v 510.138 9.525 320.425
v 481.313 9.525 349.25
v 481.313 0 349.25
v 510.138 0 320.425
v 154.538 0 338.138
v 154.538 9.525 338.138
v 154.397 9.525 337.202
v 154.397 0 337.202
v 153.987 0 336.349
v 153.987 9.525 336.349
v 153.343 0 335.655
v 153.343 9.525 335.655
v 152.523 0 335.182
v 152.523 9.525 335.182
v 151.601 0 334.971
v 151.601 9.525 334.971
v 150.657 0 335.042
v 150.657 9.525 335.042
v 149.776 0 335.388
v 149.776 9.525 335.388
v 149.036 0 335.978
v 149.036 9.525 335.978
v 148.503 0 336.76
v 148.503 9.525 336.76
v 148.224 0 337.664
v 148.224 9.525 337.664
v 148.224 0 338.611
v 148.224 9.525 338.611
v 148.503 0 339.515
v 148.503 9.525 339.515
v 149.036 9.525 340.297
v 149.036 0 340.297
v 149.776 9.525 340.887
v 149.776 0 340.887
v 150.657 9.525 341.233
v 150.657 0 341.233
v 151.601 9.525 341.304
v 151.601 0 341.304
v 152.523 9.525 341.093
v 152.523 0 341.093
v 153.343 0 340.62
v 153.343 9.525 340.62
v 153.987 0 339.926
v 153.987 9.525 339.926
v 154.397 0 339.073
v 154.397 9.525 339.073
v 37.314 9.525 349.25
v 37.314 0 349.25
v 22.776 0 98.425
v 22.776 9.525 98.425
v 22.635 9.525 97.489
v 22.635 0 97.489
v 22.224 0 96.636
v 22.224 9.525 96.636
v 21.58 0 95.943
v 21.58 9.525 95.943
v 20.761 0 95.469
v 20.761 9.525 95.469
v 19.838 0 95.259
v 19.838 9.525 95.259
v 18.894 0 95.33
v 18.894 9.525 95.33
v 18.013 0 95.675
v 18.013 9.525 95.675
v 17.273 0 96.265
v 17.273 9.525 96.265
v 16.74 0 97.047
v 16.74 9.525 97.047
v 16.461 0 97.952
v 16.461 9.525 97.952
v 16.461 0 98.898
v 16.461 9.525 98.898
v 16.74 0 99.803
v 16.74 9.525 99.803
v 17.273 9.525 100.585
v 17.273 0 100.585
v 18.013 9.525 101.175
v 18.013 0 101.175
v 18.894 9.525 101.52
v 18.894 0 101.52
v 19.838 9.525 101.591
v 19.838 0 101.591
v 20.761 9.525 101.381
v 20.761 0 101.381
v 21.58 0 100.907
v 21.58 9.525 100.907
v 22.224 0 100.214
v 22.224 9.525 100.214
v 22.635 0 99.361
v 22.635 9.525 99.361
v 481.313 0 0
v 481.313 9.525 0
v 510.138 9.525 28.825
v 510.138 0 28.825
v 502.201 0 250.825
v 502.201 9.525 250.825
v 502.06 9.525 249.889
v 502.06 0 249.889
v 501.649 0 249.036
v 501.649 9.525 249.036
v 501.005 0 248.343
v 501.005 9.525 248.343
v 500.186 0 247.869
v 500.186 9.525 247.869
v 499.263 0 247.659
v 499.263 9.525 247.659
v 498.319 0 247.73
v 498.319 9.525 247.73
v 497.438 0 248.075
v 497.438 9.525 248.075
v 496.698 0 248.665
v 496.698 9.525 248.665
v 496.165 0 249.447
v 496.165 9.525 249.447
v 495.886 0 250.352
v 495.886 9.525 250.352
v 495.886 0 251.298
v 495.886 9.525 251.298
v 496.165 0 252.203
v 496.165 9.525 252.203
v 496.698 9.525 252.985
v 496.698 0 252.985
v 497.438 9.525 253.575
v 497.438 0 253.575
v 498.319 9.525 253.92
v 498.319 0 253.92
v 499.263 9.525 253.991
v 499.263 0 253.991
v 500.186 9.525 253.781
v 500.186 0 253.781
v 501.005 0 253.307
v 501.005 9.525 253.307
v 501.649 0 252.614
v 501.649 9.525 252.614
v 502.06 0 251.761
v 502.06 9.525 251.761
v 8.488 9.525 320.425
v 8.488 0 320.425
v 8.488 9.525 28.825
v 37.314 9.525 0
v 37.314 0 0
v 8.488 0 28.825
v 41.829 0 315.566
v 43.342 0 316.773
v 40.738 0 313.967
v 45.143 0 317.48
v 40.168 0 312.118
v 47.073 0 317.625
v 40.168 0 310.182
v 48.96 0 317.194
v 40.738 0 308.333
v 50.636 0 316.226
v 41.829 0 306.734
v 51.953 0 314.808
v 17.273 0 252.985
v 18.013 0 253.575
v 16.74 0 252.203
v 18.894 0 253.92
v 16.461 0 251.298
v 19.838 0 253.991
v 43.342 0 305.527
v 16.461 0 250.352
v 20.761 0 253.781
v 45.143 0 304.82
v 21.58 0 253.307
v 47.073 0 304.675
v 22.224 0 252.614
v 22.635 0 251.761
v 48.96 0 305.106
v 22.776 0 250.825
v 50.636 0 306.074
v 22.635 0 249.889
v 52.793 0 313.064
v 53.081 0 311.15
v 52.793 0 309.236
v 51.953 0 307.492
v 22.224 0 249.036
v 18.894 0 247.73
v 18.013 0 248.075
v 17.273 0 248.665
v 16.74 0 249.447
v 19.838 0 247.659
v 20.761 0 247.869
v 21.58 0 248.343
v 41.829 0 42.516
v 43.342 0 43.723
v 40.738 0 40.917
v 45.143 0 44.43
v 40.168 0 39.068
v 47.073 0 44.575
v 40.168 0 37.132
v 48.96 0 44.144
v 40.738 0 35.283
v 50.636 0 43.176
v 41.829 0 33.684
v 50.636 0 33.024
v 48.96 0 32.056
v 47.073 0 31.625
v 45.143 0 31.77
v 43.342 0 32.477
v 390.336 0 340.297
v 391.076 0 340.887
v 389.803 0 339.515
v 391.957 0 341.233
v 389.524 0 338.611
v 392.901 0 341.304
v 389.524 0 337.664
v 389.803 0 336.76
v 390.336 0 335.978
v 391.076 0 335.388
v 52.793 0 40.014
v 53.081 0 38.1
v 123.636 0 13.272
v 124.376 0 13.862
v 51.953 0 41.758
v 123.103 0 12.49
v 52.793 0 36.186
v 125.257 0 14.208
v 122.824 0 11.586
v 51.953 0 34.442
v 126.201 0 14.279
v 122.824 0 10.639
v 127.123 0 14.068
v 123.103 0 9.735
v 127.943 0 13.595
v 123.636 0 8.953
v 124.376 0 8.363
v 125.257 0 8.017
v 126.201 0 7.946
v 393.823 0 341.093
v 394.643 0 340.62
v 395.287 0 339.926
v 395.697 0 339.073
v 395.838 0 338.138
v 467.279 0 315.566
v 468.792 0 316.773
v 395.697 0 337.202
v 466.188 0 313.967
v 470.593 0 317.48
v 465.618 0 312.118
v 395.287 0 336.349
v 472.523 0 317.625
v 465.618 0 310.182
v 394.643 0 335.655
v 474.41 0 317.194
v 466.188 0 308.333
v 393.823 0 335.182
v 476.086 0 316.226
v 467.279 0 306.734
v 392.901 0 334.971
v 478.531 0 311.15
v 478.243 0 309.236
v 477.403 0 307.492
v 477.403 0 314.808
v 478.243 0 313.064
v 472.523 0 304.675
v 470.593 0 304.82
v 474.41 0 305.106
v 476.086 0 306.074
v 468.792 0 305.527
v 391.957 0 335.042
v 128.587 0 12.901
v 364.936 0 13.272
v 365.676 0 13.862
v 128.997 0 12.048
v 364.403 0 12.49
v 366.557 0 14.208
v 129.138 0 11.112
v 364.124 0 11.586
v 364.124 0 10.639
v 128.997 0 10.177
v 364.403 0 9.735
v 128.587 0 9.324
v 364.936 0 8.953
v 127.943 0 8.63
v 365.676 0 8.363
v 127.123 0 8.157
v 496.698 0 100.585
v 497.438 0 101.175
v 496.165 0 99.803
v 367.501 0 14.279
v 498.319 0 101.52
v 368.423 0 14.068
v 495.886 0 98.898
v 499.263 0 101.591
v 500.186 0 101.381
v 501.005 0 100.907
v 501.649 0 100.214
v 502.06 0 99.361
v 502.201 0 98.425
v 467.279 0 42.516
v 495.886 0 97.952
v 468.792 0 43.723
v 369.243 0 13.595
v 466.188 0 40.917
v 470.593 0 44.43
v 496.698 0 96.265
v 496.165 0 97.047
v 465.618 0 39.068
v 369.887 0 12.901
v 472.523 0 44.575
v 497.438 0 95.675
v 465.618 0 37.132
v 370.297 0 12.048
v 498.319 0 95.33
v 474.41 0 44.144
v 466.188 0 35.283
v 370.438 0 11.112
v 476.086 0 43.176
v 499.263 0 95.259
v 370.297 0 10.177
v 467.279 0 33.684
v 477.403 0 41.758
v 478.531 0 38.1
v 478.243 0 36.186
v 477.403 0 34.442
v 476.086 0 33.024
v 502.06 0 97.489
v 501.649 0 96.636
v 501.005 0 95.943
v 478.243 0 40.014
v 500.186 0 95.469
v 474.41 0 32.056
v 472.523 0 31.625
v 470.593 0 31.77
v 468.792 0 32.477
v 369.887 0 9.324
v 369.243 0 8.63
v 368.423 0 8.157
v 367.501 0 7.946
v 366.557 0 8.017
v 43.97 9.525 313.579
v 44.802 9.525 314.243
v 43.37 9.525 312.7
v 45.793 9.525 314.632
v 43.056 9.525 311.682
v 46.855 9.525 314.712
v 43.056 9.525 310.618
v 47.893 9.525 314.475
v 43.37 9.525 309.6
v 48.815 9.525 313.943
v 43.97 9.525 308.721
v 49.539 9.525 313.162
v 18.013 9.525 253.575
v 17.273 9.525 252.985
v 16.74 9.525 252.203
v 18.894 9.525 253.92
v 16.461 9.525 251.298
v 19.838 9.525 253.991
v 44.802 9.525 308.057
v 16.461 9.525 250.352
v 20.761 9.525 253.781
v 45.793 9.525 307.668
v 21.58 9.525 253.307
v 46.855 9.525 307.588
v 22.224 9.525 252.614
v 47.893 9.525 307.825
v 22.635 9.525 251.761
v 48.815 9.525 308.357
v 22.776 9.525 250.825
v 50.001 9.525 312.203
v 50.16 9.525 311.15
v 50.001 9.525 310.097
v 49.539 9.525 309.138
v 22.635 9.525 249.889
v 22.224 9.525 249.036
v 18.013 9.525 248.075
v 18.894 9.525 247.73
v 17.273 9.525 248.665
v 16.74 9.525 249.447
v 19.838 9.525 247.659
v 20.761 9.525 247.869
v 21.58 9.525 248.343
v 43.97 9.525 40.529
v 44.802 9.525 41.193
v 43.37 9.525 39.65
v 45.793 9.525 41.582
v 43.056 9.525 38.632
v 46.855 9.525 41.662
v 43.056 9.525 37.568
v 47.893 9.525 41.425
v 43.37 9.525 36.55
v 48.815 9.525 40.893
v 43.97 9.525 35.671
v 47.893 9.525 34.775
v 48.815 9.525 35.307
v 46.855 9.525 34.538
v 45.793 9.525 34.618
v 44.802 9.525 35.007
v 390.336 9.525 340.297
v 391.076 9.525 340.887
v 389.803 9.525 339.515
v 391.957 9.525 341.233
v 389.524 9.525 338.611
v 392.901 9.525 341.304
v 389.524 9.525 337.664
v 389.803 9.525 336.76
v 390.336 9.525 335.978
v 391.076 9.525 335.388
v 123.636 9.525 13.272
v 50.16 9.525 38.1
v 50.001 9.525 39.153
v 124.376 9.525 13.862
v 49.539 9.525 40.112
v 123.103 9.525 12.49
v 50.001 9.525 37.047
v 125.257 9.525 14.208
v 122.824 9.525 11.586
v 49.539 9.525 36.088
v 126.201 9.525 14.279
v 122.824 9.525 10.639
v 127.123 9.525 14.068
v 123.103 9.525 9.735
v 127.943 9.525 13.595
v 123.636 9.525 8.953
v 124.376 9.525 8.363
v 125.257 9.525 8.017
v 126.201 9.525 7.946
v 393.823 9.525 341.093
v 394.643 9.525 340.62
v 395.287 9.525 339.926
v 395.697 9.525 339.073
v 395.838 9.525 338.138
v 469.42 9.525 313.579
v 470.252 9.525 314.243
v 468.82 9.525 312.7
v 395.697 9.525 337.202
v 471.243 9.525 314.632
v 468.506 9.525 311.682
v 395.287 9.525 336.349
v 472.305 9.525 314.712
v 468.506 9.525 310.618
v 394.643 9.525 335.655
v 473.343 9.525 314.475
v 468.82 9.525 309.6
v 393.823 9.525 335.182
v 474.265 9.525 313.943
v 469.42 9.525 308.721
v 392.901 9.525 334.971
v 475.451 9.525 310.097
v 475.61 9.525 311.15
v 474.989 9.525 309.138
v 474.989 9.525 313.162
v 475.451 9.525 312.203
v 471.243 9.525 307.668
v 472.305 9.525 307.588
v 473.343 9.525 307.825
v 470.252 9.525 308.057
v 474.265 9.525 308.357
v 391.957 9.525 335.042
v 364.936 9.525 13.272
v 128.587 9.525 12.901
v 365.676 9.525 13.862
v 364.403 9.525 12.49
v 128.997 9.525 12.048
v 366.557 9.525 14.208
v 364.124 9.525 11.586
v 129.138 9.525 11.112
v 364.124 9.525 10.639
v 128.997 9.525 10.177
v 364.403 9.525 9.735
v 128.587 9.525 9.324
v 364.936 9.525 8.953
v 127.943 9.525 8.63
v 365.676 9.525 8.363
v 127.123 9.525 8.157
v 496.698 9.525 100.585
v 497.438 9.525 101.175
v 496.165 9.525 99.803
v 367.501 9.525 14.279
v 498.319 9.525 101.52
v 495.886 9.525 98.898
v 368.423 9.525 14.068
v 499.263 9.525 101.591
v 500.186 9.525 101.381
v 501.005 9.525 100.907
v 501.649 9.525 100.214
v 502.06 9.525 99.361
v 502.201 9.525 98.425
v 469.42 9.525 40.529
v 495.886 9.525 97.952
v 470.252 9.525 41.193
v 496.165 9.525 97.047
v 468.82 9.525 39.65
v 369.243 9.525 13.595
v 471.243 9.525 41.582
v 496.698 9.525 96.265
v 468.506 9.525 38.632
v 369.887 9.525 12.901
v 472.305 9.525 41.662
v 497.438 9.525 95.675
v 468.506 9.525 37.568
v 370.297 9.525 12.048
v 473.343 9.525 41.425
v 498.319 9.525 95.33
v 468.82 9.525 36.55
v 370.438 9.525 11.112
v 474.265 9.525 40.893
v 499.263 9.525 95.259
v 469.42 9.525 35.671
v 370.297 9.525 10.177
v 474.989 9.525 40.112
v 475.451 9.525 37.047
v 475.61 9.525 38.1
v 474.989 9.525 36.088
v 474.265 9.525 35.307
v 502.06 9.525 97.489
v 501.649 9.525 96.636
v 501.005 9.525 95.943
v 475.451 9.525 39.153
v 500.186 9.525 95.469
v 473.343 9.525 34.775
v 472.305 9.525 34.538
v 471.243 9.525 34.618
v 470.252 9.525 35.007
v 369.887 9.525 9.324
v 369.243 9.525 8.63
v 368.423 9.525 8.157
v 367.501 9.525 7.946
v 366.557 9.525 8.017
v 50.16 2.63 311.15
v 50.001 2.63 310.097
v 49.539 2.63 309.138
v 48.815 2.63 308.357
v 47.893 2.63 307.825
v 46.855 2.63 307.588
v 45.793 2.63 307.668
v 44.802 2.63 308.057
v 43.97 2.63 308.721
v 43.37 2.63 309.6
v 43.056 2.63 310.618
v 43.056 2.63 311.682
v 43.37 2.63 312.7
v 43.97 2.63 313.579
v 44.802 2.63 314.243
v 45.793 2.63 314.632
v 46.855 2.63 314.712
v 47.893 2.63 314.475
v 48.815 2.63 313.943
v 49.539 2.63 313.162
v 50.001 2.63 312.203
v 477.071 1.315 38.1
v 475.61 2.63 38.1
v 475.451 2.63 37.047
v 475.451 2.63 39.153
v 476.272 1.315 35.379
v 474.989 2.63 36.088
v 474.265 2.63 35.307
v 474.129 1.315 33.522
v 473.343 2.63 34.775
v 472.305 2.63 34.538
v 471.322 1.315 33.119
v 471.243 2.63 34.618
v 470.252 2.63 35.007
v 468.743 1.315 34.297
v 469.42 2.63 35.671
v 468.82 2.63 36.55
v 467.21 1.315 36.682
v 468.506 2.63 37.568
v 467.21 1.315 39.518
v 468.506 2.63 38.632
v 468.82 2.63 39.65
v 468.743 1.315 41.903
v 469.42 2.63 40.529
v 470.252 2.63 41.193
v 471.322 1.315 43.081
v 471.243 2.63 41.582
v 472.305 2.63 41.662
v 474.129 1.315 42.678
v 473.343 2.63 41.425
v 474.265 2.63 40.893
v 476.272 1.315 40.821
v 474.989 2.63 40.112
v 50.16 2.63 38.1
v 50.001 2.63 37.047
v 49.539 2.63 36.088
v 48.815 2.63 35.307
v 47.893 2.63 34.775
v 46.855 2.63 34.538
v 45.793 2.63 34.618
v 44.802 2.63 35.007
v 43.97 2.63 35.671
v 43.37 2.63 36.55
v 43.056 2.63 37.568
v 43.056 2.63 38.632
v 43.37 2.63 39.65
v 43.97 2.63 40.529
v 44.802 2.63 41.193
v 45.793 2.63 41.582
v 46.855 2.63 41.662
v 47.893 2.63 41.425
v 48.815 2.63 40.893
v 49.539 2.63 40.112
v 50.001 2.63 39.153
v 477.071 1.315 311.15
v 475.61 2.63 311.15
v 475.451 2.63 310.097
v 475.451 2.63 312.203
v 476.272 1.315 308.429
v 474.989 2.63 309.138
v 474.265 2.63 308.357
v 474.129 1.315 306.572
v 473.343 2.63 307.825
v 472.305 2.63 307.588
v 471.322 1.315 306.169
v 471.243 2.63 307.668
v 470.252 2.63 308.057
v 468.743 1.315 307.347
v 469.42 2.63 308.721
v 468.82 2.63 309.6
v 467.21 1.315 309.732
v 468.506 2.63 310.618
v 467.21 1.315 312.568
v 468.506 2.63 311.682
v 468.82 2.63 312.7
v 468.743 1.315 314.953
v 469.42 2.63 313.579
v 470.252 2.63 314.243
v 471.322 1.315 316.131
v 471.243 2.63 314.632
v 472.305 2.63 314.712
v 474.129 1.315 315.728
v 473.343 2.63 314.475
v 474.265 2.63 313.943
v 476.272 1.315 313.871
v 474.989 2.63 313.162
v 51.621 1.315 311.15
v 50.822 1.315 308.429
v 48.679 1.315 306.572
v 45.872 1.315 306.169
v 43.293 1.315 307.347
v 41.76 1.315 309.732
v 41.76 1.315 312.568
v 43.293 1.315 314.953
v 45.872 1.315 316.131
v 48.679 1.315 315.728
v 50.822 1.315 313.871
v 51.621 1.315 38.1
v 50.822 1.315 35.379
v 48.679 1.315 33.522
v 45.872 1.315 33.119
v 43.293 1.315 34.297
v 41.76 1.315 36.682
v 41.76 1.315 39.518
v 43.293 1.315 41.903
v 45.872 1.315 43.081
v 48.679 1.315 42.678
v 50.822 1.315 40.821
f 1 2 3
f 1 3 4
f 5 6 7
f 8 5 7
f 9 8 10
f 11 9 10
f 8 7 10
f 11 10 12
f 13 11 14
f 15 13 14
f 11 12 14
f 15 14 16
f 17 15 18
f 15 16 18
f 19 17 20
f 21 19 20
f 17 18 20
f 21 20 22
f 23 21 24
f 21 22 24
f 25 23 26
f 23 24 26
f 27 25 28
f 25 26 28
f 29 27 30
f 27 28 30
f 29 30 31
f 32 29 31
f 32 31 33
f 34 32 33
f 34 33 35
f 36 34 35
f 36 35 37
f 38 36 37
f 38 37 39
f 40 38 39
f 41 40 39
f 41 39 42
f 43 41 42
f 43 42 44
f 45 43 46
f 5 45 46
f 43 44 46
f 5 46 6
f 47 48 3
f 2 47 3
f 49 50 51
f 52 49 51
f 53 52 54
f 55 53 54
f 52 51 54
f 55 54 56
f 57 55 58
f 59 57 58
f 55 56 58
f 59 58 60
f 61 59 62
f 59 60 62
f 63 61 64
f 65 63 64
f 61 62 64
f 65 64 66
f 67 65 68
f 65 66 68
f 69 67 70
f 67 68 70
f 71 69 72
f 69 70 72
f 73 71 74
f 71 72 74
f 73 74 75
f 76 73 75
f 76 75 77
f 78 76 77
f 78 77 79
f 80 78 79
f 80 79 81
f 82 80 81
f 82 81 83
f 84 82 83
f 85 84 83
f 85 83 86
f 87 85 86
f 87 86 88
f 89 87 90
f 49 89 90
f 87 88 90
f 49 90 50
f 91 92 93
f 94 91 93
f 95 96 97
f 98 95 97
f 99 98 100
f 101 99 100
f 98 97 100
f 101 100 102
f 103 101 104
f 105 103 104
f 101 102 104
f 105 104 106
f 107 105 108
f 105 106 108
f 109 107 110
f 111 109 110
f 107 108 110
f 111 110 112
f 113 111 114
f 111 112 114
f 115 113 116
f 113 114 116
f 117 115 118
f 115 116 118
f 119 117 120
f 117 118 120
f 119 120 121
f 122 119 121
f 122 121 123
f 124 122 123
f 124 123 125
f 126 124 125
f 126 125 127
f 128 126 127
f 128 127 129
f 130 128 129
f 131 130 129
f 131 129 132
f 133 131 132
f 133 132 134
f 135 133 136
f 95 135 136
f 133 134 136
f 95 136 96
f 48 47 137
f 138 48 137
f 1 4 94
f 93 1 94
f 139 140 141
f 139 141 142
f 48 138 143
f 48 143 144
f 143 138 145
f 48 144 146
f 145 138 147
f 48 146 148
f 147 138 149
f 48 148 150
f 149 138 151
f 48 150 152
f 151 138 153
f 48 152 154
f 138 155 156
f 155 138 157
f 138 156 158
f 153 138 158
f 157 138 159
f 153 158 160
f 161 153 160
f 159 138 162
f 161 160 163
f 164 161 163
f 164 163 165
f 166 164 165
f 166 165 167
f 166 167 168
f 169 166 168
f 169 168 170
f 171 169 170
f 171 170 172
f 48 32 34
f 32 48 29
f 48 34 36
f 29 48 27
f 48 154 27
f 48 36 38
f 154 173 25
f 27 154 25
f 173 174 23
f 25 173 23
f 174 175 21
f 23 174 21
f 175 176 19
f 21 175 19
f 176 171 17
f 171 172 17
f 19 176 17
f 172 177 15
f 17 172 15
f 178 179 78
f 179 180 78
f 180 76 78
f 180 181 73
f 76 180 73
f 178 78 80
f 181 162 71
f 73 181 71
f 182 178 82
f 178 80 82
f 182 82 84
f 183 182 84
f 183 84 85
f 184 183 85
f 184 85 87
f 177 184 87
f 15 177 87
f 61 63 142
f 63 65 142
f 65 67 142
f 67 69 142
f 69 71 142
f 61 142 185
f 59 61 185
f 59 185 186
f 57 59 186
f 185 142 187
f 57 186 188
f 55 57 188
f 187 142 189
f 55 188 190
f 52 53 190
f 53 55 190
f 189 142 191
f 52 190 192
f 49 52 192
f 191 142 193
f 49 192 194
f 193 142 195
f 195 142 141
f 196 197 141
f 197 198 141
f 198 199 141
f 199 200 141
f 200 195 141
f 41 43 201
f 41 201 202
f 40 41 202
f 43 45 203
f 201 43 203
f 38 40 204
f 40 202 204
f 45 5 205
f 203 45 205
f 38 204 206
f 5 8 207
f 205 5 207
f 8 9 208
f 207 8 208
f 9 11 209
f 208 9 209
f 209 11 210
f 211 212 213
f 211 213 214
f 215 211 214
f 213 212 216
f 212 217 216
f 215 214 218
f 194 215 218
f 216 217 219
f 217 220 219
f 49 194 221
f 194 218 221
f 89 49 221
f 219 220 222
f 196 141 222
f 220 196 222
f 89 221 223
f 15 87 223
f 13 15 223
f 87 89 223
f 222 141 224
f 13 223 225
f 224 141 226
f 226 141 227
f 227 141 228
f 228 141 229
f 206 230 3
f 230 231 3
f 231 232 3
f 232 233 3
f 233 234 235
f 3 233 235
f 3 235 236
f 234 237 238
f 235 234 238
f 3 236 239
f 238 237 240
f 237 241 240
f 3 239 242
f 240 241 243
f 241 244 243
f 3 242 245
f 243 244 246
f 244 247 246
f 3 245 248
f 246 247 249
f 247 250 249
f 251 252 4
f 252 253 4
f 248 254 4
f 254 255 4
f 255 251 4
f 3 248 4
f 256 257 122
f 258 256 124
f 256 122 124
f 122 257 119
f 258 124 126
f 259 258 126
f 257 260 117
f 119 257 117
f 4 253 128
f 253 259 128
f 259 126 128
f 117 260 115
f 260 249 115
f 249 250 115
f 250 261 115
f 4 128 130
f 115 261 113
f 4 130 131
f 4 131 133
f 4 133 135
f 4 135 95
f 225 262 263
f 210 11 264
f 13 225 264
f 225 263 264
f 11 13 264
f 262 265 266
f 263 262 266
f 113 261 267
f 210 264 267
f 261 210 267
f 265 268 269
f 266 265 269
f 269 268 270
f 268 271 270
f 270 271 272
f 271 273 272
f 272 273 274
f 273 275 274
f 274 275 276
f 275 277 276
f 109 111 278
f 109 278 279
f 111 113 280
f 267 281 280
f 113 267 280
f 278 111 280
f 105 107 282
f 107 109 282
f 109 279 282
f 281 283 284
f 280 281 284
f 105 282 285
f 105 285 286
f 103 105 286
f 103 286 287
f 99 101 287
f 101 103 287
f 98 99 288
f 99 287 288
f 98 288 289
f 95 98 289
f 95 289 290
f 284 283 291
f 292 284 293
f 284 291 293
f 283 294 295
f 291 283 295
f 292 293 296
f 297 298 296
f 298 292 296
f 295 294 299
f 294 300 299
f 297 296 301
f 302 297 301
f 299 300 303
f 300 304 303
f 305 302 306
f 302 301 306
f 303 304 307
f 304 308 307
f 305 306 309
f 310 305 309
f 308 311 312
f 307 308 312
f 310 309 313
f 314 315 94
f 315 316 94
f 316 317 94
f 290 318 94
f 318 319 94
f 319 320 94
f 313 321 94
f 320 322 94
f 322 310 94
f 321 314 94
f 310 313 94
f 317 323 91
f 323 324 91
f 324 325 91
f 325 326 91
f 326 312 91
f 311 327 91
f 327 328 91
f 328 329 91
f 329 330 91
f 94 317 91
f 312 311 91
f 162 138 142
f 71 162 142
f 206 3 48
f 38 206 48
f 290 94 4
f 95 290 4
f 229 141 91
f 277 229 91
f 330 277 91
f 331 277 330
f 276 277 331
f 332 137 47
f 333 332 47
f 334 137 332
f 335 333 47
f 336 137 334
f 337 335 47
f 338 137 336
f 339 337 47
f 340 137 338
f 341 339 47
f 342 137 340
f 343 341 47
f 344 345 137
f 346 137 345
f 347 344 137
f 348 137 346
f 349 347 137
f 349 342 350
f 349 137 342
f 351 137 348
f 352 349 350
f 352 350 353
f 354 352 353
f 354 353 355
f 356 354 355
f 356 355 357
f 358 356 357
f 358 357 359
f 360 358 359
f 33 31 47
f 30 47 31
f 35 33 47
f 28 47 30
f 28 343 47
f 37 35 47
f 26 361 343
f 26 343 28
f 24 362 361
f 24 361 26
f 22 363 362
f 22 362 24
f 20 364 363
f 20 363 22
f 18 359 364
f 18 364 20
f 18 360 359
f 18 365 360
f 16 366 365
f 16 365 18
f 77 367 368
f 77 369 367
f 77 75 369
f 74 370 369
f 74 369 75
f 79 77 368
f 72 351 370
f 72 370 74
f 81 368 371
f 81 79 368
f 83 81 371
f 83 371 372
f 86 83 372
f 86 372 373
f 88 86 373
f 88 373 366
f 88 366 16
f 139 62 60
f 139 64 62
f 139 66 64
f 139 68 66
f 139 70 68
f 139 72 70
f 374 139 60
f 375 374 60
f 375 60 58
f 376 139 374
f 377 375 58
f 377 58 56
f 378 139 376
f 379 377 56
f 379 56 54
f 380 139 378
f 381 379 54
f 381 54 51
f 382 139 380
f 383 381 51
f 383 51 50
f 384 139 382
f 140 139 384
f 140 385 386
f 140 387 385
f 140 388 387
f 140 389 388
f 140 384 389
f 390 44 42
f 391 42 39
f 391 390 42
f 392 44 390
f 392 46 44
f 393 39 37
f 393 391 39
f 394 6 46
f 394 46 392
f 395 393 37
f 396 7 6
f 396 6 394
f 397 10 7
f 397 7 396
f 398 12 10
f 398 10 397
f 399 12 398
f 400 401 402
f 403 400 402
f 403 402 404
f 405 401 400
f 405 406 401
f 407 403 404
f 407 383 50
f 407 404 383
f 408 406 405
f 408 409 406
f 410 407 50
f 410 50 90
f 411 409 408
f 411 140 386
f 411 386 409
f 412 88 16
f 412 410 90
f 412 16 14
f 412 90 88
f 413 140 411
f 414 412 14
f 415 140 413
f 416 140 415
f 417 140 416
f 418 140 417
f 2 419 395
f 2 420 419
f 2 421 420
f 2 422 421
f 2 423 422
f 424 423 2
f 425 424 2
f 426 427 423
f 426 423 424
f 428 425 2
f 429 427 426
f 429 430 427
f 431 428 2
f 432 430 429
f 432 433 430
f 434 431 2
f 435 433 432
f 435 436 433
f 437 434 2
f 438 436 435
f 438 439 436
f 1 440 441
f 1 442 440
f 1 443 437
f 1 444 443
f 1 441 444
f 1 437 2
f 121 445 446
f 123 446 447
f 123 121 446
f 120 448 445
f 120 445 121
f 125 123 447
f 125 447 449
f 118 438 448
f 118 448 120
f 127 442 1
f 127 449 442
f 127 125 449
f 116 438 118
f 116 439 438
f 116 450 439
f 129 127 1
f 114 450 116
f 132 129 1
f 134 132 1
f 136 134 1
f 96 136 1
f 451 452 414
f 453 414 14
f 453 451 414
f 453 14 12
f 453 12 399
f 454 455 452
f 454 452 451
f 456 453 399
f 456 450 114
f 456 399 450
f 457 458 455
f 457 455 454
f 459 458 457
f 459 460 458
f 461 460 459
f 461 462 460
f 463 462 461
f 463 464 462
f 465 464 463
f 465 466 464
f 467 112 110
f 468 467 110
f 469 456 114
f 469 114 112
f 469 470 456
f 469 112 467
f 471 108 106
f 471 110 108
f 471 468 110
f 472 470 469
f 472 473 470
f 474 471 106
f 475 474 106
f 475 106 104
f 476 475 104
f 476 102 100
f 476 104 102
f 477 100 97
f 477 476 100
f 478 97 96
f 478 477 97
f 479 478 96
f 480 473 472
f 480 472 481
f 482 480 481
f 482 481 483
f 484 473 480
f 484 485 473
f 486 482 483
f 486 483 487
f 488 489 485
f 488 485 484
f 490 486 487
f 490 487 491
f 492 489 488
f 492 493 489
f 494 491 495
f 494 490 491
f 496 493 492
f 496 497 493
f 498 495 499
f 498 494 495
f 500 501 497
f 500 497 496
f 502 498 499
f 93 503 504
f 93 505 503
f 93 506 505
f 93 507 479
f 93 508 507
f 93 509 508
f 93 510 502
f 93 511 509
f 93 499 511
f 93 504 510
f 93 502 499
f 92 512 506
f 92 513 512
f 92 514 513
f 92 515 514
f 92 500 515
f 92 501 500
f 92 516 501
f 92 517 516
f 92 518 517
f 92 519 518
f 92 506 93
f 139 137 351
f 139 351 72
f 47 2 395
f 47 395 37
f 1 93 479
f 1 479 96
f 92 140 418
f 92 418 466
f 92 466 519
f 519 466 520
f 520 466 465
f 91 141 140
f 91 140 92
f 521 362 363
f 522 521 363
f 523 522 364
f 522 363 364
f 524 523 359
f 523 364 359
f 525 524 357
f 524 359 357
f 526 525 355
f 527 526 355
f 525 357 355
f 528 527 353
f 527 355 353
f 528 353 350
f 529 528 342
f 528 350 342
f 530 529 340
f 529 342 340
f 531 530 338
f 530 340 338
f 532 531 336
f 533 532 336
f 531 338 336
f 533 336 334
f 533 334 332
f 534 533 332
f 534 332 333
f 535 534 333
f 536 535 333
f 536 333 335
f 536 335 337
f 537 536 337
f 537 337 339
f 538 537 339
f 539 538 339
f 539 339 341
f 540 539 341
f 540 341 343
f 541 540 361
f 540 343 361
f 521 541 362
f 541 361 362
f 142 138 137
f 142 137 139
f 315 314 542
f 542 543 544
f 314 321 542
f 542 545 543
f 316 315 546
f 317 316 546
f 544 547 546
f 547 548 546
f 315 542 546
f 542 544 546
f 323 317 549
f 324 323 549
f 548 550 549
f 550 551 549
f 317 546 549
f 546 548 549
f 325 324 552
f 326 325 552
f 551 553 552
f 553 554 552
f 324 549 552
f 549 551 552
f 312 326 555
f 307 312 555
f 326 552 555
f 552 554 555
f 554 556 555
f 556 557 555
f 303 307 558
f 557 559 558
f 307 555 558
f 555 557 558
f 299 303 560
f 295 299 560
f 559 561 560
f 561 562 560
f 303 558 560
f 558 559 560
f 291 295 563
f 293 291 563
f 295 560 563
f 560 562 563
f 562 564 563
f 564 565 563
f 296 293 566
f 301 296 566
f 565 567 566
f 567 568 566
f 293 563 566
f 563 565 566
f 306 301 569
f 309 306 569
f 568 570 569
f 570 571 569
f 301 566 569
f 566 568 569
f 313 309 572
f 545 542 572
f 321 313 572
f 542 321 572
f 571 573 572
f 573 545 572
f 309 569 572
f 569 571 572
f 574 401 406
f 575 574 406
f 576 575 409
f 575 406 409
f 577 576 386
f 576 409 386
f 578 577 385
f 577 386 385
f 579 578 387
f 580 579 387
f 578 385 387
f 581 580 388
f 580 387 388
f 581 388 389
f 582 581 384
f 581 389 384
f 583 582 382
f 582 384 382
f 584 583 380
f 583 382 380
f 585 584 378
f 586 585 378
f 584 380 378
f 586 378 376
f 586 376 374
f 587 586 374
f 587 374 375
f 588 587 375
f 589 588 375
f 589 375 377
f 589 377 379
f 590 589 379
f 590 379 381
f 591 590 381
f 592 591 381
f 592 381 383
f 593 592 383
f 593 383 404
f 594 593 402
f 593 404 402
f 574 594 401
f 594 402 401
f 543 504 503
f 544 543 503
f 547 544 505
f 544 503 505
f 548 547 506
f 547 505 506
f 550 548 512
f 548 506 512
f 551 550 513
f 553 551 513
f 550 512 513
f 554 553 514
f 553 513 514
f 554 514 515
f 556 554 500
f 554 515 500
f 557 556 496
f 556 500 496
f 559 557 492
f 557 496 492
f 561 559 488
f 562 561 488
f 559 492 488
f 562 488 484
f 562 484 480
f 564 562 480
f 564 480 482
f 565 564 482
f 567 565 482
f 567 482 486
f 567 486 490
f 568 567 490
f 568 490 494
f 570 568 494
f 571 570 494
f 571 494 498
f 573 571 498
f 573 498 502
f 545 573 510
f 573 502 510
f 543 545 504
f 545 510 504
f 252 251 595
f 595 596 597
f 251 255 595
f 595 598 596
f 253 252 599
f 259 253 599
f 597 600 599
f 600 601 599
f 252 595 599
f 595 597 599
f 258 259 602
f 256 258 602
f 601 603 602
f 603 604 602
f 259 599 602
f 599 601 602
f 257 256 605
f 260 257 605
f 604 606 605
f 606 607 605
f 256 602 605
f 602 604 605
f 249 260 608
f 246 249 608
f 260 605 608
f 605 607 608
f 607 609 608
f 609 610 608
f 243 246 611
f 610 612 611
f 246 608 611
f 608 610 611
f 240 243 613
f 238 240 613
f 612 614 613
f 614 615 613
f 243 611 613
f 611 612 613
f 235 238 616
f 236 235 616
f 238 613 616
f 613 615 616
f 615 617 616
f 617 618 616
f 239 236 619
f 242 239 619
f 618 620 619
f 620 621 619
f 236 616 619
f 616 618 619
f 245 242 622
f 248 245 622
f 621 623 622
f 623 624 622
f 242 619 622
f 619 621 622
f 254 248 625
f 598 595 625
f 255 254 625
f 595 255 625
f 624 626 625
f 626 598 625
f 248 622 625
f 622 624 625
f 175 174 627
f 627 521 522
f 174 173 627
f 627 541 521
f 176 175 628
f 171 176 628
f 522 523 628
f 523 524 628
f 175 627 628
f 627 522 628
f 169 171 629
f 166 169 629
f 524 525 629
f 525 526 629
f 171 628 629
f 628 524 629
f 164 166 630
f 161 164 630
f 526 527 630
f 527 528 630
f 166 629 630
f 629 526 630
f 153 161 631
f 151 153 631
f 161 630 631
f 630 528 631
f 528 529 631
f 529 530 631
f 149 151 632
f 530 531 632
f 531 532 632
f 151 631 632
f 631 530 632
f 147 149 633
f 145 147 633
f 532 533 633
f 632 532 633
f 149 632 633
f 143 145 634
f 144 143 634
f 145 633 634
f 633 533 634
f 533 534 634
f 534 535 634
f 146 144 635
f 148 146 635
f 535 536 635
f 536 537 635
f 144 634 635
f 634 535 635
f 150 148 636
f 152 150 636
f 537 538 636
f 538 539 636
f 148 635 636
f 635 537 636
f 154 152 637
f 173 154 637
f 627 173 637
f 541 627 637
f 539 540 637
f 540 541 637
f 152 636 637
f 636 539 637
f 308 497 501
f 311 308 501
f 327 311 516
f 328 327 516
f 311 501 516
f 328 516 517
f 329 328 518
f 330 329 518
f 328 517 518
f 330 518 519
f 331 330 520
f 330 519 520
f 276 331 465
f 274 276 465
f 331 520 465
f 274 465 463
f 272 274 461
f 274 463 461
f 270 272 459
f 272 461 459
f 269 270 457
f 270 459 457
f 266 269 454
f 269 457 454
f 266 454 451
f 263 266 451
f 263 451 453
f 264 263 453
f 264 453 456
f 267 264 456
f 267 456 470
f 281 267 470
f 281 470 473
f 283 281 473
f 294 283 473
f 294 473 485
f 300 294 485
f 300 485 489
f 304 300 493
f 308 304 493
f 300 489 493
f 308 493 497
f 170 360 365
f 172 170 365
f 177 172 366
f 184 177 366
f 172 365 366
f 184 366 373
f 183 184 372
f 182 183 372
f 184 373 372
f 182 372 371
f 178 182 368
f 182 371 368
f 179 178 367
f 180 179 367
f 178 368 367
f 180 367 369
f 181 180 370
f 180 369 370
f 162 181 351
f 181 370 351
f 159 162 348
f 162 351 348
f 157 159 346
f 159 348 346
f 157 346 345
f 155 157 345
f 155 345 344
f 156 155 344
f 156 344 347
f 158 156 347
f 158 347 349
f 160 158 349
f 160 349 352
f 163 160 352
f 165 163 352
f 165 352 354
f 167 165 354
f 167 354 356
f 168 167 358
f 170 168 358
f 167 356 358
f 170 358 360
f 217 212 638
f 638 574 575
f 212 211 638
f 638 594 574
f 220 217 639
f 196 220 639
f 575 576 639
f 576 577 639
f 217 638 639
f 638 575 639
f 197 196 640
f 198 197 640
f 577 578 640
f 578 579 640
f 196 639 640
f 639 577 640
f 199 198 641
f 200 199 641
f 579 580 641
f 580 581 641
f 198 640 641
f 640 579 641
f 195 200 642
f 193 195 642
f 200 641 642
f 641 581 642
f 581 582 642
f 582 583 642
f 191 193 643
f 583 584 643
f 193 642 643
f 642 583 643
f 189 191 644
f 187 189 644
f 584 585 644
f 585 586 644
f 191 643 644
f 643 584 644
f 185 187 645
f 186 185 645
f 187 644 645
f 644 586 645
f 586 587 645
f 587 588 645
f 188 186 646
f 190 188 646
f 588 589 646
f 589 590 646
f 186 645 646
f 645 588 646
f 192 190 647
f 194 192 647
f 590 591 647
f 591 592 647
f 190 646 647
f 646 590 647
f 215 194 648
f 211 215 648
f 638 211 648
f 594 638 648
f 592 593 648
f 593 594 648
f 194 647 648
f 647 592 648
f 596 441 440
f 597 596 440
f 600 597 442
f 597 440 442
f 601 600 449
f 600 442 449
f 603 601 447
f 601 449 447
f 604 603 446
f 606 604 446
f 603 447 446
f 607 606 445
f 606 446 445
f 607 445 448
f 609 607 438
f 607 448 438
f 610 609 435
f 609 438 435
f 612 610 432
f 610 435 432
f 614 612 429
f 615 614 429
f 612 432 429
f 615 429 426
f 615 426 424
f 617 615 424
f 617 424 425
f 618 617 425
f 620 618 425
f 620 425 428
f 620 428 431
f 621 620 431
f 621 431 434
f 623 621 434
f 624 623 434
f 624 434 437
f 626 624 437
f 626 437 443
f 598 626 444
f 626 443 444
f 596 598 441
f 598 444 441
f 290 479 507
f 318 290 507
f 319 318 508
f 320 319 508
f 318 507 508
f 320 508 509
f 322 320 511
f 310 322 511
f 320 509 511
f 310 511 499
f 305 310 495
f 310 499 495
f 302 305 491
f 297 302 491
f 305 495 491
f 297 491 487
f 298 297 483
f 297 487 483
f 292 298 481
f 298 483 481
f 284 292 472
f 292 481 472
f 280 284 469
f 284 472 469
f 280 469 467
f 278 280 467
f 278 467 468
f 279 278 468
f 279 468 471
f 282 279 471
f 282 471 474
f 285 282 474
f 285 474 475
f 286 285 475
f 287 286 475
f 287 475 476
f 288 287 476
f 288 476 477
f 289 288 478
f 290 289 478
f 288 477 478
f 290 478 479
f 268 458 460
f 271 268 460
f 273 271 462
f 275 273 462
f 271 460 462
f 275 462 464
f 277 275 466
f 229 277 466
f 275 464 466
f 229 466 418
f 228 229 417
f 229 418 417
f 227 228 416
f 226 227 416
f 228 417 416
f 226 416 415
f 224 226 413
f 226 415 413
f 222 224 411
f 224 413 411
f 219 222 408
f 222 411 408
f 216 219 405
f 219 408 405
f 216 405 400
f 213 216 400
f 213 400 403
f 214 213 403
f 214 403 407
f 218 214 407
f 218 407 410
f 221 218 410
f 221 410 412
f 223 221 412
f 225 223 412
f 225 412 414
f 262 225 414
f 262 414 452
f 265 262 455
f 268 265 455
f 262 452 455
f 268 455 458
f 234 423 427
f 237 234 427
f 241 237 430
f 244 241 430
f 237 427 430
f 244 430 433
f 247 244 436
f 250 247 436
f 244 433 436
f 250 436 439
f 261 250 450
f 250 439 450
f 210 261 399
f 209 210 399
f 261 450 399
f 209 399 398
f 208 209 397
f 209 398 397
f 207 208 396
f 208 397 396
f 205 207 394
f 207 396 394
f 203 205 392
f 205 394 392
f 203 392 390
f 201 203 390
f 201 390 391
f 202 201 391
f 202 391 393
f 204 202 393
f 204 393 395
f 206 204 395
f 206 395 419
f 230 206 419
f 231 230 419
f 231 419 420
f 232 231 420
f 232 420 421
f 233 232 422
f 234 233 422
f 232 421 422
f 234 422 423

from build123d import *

# Parameters (mm, degrees)
SKETCH1_W           = 501.65
SKETCH1_H           = 349.25
BOSS_EXTRUDE1_DEPTH = 9.525
SKETCH2_R           = 3.175
CUT_EXTRUDE1_DEPTH  = 9.525
SKETCH4_R           = 3.571875
CUT_EXTRUDE2_DEPTH  = 9.525
CHAMFER1_SIZE       = 2.921
CHAMFER1_SIZE2      = 2.630080213
CUT_EXTRUDE3_DEPTH  = 9.525


with BuildPart() as part:
    # Sketch1 → Boss-Extrude1 (new body)
    with BuildSketch(Plane(origin=(0, 0, 0), x_dir=(1, 0, 0), z_dir=(0, 1, 0))):
        with Locations((259.3132527, -174.625)):
            Rectangle(SKETCH1_W, SKETCH1_H)
    extrude(amount=BOSS_EXTRUDE1_DEPTH)

    # Sketch2 → Cut-Extrude1 (cut)
    with BuildSketch(Plane(origin=(0, 9.525, 0), x_dir=(1, 0, 0), z_dir=(0, 1, 0))):
        with Locations((392.6632527, -338.1375)):
            Circle(SKETCH2_R)
        with Locations((151.3632527, -338.1375)):
            Circle(SKETCH2_R)
        with Locations((367.2632527, -11.1125)):
            Circle(SKETCH2_R)
        with Locations((125.9632527, -11.1125)):
            Circle(SKETCH2_R)
        with Locations((19.6007527, -250.825)):
            Circle(SKETCH2_R)
        with Locations((19.6007527, -98.425)):
            Circle(SKETCH2_R)
        with Locations((499.0257527, -250.825)):
            Circle(SKETCH2_R)
        with Locations((499.0257527, -98.425)):
            Circle(SKETCH2_R)
    extrude(amount=-CUT_EXTRUDE1_DEPTH, mode=Mode.SUBTRACT)

    # Sketch4 → Cut-Extrude2 (cut)
    with BuildSketch(Plane(origin=(0, 9.525, 0), x_dir=(1, 0, 0), z_dir=(0, 1, 0))):
        with Locations((472.0382527, -38.1)):
            Circle(SKETCH4_R)
        with Locations((472.0382527, -311.15)):
            Circle(SKETCH4_R)
        with Locations((46.5882527, -311.15)):
            Circle(SKETCH4_R)
        with Locations((46.5882527, -38.1)):
            Circle(SKETCH4_R)
    extrude(amount=-CUT_EXTRUDE2_DEPTH, mode=Mode.SUBTRACT)

    # Chamfer1
    chamfer1_edges = [part.edges().sort_by_distance(p)[0] for p in [
        (43.0163777, 0, 38.1),
        (43.0163777, 0, 311.15),
        (468.4663777, 0, 311.15),
        (468.4663777, 0, 38.1),
    ]]
    chamfer1_side = [part.faces().sort_by_distance(p)[0] for p in [
        (259.3132527, 0, 174.625),
    ]]
    chamfer(chamfer1_edges, length=CHAMFER1_SIZE, length2=CHAMFER1_SIZE2, reference=chamfer1_side[0])

    # Sketch5 → Cut-Extrude3 (cut)
    with BuildSketch(Plane(origin=(0, 9.525, 0), x_dir=(1, 0, 0), z_dir=(0, 1, 0))):
        Polygon((37.3137367, 0), (8.4882527, -28.825484), (8.4882527, 0), align=None)
        Polygon((510.1382527, -28.825484), (510.1382527, 0), (481.3127687, 0), align=None)
        Polygon((481.3127687, -349.25), (510.1382527, -320.424516), (510.1382527, -349.25), align=None)
        Polygon((8.4882527, -320.424516), (8.4882527, -349.25), (37.3137367, -349.25), align=None)
    extrude(amount=-CUT_EXTRUDE3_DEPTH, mode=Mode.SUBTRACT)


solid = part.part
